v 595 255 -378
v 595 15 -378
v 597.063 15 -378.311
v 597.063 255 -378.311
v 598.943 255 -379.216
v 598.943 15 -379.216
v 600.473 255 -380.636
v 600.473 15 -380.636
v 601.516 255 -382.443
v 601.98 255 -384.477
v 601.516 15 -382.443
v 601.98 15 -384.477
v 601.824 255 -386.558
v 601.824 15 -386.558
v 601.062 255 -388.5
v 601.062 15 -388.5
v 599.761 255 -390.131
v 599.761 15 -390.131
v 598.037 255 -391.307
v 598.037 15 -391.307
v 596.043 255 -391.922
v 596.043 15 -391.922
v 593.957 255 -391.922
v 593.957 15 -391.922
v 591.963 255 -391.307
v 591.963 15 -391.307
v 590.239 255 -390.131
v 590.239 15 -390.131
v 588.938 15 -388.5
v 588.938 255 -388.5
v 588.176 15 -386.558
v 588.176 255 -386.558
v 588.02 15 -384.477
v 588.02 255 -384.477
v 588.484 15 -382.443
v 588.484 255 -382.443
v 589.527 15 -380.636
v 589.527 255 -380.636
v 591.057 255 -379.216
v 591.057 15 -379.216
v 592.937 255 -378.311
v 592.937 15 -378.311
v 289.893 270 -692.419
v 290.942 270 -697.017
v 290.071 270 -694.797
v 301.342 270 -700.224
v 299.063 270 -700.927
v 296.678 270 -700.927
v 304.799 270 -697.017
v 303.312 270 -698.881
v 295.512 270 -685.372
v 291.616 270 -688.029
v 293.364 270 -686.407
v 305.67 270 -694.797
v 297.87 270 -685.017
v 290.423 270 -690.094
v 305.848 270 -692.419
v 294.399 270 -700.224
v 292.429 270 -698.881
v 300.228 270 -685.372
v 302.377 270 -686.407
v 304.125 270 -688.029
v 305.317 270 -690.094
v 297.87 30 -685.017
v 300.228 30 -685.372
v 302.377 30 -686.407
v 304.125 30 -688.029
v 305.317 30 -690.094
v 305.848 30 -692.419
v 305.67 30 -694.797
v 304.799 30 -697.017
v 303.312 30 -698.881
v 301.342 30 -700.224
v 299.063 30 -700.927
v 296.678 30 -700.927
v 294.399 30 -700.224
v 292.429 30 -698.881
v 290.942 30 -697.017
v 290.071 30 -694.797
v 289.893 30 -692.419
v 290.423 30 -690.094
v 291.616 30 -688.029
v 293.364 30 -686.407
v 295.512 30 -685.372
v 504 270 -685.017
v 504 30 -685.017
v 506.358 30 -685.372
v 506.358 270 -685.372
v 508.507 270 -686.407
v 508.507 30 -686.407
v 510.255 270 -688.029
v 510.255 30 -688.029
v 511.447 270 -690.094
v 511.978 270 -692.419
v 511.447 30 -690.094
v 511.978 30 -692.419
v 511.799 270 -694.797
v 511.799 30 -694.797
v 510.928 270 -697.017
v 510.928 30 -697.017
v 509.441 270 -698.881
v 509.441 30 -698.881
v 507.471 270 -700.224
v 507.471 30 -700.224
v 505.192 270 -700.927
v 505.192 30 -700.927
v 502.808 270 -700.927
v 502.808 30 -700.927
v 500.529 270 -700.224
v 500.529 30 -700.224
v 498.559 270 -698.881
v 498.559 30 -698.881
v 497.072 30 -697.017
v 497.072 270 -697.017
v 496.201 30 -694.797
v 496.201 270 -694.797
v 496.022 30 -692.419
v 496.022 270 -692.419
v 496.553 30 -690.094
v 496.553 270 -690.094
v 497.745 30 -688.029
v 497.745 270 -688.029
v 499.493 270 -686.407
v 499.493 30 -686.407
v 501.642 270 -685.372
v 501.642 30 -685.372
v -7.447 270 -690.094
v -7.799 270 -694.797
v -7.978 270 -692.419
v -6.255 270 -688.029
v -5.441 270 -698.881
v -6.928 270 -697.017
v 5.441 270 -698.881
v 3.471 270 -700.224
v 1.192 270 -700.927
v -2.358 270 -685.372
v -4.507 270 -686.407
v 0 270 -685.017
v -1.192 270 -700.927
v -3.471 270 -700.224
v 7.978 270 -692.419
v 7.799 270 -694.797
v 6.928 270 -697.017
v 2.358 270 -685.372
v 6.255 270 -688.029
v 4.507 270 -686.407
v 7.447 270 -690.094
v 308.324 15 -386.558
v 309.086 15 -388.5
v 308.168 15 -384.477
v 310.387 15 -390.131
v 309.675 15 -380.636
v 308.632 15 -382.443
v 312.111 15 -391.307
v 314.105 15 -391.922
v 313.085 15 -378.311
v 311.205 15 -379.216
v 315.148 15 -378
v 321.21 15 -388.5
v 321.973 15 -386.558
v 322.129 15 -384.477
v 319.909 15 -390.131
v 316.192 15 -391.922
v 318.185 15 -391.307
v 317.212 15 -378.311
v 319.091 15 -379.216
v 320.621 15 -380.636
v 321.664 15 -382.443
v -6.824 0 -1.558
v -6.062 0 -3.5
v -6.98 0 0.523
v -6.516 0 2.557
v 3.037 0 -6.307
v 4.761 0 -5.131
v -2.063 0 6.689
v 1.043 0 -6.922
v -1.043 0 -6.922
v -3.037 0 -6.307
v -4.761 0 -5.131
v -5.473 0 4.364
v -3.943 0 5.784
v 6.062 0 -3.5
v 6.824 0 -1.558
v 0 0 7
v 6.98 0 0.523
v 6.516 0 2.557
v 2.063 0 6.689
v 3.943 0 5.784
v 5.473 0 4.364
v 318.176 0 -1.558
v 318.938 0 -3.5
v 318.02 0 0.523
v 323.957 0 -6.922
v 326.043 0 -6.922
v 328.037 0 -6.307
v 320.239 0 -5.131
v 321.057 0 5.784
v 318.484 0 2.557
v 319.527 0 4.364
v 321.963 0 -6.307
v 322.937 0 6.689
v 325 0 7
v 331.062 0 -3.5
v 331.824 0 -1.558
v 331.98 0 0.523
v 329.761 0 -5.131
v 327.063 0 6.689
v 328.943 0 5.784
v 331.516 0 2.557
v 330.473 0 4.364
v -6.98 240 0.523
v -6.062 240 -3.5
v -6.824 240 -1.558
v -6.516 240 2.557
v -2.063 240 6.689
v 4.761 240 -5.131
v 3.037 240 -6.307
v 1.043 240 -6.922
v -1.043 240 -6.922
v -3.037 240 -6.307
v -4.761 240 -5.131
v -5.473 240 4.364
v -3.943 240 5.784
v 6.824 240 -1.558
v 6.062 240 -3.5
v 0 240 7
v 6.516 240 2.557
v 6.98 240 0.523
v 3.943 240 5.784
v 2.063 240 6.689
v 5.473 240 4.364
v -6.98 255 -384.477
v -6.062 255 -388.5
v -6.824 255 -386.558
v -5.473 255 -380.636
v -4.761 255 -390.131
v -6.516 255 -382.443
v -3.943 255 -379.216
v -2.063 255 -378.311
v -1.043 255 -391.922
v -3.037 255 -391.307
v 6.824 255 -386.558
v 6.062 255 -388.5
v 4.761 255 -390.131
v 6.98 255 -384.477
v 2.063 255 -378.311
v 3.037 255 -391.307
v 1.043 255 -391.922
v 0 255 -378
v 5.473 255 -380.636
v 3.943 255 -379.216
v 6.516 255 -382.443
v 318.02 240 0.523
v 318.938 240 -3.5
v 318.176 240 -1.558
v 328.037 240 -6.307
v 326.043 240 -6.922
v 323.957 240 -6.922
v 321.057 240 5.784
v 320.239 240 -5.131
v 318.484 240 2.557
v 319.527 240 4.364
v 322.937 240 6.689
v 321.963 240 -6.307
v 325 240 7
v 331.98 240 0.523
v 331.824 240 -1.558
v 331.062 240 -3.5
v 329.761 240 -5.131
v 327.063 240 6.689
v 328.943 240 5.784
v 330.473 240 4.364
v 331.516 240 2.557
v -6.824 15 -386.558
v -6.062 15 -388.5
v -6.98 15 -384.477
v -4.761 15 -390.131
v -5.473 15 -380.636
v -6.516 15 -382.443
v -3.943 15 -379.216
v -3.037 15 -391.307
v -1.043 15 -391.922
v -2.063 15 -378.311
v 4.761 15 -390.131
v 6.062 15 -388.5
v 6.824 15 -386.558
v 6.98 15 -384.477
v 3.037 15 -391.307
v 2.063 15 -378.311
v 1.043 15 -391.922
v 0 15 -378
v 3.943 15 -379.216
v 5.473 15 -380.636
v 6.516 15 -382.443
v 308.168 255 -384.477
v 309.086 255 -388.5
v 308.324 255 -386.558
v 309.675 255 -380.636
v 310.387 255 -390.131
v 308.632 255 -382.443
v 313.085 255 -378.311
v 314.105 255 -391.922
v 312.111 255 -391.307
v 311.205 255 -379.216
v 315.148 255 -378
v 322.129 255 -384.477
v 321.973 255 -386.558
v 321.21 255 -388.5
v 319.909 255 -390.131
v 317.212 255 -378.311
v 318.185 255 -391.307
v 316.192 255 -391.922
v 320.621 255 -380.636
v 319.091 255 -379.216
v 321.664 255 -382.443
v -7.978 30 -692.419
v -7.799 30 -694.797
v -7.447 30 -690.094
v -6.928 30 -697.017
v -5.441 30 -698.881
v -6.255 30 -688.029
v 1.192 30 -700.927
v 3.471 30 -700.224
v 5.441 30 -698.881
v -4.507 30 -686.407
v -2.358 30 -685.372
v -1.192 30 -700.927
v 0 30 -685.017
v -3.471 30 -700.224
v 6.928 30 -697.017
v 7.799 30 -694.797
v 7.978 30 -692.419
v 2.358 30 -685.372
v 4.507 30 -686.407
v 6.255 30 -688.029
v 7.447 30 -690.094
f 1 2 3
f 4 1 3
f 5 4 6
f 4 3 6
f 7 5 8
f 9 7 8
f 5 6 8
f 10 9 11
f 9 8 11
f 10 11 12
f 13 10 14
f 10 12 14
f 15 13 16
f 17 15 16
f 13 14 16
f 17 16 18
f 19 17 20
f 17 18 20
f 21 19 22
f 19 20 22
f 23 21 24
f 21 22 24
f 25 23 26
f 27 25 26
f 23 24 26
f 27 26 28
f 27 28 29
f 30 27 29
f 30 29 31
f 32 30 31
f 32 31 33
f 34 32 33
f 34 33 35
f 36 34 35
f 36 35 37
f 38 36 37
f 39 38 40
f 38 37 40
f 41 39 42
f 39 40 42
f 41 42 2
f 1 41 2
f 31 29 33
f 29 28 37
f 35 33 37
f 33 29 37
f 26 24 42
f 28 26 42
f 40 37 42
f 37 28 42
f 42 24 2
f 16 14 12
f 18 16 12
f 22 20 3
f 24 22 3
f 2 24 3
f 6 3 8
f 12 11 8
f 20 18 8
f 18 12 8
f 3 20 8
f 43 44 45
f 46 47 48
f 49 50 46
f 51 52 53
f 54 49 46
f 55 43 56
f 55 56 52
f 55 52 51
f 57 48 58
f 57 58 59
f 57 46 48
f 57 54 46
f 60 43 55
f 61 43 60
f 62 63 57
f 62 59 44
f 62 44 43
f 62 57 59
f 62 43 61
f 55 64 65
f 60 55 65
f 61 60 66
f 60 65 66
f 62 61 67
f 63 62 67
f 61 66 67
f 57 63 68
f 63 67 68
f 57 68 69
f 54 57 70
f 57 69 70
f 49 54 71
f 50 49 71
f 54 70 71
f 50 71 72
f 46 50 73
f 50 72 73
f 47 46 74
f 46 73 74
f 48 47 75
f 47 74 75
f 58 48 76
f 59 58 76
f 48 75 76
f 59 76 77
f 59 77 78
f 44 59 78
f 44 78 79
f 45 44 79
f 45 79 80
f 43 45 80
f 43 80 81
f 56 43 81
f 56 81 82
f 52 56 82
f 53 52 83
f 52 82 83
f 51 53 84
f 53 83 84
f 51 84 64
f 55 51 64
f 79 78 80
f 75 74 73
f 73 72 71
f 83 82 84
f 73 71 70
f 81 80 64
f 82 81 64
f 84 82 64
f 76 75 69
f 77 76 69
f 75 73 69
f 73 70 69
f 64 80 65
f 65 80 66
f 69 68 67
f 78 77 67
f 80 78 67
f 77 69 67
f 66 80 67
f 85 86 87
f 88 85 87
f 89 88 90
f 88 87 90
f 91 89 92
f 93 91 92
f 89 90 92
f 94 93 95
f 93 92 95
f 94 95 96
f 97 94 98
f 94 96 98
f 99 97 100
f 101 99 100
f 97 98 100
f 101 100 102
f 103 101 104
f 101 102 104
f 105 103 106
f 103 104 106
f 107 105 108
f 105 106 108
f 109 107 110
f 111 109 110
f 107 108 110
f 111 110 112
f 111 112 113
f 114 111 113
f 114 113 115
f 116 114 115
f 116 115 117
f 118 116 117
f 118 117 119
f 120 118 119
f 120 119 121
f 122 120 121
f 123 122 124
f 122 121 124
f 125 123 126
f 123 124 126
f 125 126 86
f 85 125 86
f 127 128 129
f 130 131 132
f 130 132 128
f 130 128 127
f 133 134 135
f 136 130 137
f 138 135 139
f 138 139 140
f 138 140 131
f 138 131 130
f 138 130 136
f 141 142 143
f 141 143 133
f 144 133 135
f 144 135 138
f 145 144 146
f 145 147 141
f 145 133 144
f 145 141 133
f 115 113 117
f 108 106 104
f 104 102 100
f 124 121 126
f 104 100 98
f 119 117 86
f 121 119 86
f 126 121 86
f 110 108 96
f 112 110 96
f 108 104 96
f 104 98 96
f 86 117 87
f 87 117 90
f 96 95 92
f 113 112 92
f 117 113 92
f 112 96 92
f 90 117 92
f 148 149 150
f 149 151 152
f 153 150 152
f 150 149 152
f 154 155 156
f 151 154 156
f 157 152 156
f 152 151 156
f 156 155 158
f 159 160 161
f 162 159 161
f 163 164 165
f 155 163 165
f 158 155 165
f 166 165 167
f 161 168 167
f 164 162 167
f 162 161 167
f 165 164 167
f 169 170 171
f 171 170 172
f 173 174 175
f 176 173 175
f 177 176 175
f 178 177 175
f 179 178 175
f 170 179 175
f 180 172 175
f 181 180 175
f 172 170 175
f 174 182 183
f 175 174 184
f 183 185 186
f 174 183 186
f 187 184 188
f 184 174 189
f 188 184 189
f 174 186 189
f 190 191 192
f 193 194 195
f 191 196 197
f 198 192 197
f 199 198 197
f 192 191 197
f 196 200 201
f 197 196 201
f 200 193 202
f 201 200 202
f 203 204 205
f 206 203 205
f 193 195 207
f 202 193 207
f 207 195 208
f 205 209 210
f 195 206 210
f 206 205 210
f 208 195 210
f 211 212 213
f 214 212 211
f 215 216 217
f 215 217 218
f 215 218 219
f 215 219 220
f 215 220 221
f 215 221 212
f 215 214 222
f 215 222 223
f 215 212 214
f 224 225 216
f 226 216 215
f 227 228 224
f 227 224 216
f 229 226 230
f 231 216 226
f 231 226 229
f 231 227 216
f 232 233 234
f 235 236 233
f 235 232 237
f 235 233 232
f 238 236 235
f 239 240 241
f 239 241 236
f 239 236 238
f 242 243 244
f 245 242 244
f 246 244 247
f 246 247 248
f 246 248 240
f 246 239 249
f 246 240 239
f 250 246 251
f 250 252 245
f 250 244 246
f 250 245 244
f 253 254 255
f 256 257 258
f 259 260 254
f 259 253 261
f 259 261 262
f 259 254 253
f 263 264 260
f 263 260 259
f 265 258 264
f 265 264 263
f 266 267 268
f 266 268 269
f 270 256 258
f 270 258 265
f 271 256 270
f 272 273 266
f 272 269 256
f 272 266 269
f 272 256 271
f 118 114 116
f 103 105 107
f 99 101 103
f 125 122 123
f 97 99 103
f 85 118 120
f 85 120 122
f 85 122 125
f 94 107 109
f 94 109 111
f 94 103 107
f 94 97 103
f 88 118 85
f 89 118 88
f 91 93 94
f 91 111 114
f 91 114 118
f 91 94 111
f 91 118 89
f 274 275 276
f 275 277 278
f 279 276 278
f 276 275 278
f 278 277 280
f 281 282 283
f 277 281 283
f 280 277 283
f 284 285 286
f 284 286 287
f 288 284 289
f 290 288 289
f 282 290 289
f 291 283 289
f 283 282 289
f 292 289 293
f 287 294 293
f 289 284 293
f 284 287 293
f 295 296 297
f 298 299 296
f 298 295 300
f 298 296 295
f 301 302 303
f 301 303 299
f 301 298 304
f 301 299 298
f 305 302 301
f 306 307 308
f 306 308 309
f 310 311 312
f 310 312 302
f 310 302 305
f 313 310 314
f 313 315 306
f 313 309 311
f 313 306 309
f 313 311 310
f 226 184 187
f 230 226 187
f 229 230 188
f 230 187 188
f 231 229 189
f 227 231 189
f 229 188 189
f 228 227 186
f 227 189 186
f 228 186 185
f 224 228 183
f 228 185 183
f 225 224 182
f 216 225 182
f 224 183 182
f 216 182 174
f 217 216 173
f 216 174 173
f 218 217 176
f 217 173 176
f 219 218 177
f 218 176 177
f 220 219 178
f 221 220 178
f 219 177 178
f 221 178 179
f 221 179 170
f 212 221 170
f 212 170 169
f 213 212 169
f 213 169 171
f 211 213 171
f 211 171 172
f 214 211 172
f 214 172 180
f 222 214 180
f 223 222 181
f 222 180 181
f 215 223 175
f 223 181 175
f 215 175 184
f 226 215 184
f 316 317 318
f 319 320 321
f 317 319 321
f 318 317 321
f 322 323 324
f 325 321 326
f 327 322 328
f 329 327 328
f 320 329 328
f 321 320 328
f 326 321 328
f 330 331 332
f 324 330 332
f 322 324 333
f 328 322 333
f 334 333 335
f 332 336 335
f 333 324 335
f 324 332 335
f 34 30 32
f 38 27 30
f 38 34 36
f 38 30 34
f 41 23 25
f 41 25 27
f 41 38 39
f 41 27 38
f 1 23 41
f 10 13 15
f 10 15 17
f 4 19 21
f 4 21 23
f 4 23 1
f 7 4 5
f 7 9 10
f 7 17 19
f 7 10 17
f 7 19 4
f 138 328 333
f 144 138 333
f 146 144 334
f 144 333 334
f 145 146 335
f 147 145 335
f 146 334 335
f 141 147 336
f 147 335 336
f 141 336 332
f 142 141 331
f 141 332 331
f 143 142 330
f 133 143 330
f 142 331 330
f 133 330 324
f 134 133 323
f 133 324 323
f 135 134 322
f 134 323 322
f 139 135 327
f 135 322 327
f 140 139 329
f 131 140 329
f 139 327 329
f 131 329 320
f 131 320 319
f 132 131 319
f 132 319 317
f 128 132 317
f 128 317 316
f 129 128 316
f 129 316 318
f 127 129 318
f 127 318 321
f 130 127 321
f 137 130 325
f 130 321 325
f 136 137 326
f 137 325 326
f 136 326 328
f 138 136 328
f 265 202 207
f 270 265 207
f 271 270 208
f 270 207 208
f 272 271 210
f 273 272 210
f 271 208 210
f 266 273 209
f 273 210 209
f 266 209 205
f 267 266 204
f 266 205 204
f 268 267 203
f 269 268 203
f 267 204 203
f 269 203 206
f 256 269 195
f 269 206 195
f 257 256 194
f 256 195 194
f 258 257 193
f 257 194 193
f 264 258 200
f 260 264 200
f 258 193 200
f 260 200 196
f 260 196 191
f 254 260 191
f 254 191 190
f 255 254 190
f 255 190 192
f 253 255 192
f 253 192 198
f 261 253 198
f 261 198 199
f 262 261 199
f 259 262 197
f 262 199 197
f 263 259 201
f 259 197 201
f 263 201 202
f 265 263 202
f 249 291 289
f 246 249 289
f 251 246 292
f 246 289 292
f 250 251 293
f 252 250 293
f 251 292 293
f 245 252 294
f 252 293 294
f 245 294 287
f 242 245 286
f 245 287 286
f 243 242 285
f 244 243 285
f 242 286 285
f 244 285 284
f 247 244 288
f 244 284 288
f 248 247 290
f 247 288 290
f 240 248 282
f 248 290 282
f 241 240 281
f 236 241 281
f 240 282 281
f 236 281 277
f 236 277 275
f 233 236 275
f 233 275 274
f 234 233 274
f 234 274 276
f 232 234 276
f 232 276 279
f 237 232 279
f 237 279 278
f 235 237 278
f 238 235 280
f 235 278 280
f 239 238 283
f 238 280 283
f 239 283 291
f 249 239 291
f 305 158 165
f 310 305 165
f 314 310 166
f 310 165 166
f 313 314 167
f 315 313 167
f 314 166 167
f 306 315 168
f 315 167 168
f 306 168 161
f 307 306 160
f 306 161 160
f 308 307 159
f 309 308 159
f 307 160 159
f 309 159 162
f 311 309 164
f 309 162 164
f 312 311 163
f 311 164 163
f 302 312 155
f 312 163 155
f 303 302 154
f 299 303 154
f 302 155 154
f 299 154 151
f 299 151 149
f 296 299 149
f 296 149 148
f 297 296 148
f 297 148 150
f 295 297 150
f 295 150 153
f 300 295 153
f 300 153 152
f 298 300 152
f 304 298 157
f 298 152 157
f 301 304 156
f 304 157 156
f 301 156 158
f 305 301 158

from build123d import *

# Parameters (mm, degrees)
ESBO_O2_R                  = 8
RESSALTO_EXTRUS_O2_DEPTH   = 240
RESSALTO_EXTRUS_O2_2_DEPTH = 240
RESSALTO_EXTRUS_O2_3_DEPTH = 240
ESBO_O6_R                  = 7
RESSALTO_EXTRUS_O3_DEPTH   = 240
RESSALTO_EXTRUS_O3_2_DEPTH = 240
RESSALTO_EXTRUS_O3_3_DEPTH = 240
ESBO_O7_R                  = 7
RESSALTO_EXTRUS_O4_DEPTH   = 240
RESSALTO_EXTRUS_O4_2_DEPTH = 240


with BuildPart() as part:
    # Esboço2 → Ressalto-extrusão2 (new body)
    with BuildSketch(Plane(origin=(0, 30, 0), x_dir=(1, 0, 0), z_dir=(0, 1, 0))):
        with Locations(Location((0, 693.016670883, 0), (0, 0, 270))):
            Circle(ESBO_O2_R)
    extrude(amount=RESSALTO_EXTRUS_O2_DEPTH)


with BuildPart() as body_2:
    # Esboço2 → Ressalto-extrus_o2 2 (new body)
    with BuildSketch(Plane(origin=(0, 30, 0), x_dir=(1, 0, 0), z_dir=(0, 1, 0))):
        with Locations(Location((297.870449082, 693.016670883, 0), (0, 0, 270))):
            Circle(ESBO_O2_R)
    extrude(amount=RESSALTO_EXTRUS_O2_2_DEPTH)


with BuildPart() as body_3:
    # Esboço2 → Ressalto-extrus_o2 3 (new body)
    with BuildSketch(Plane(origin=(0, 30, 0), x_dir=(1, 0, 0), z_dir=(0, 1, 0))):
        with Locations(Location((504, 693.016670883, 0), (0, 0, 270))):
            Circle(ESBO_O2_R)
    extrude(amount=RESSALTO_EXTRUS_O2_3_DEPTH)


with BuildPart() as body_4:
    # Esboço6 → Ressalto-extrusão3 (new body)
    with BuildSketch(Plane(origin=(0, 15, 0), x_dir=(1, 0, 0), z_dir=(0, 1, 0))):
        with Locations(Location((0, 385, 0), (0, 0, 270))):
            Circle(ESBO_O6_R)
    extrude(amount=RESSALTO_EXTRUS_O3_DEPTH)


with BuildPart() as body_5:
    # Esboço6 → Ressalto-extrus_o3 2 (new body)
    with BuildSketch(Plane(origin=(0, 15, 0), x_dir=(1, 0, 0), z_dir=(0, 1, 0))):
        with Locations(Location((315.148251138, 385, 0), (0, 0, 270))):
            Circle(ESBO_O6_R)
    extrude(amount=RESSALTO_EXTRUS_O3_2_DEPTH)


with BuildPart() as body_6:
    # Esboço6 → Ressalto-extrus_o3 3 (new body)
    with BuildSketch(Plane(origin=(0, 15, 0), x_dir=(1, 0, 0), z_dir=(0, 1, 0))):
        with Locations(Location((595, 385, 0), (0, 0, 270))):
            Circle(ESBO_O6_R)
    extrude(amount=RESSALTO_EXTRUS_O3_3_DEPTH)


with BuildPart() as body_7:
    # Esboço7 → Ressalto-extrusão4 (new body)
    with BuildSketch(Plane(origin=(0, 0, 0), x_dir=(1, 0, 0), z_dir=(0, 1, 0))):
        with Locations(Location((0, 0, 0), (0, 0, 270))):
            Circle(ESBO_O7_R)
    extrude(amount=RESSALTO_EXTRUS_O4_DEPTH)


with BuildPart() as body_8:
    # Esboço7 → Ressalto-extrus_o4 2 (new body)
    with BuildSketch(Plane(origin=(0, 0, 0), x_dir=(1, 0, 0), z_dir=(0, 1, 0))):
        with Locations(Location((325, 0, 0), (0, 0, 270))):
            Circle(ESBO_O7_R)
    extrude(amount=RESSALTO_EXTRUS_O4_2_DEPTH)


solid = Compound([part.part, body_2.part, body_3.part, body_4.part, body_5.part, body_6.part, body_7.part, body_8.part])
